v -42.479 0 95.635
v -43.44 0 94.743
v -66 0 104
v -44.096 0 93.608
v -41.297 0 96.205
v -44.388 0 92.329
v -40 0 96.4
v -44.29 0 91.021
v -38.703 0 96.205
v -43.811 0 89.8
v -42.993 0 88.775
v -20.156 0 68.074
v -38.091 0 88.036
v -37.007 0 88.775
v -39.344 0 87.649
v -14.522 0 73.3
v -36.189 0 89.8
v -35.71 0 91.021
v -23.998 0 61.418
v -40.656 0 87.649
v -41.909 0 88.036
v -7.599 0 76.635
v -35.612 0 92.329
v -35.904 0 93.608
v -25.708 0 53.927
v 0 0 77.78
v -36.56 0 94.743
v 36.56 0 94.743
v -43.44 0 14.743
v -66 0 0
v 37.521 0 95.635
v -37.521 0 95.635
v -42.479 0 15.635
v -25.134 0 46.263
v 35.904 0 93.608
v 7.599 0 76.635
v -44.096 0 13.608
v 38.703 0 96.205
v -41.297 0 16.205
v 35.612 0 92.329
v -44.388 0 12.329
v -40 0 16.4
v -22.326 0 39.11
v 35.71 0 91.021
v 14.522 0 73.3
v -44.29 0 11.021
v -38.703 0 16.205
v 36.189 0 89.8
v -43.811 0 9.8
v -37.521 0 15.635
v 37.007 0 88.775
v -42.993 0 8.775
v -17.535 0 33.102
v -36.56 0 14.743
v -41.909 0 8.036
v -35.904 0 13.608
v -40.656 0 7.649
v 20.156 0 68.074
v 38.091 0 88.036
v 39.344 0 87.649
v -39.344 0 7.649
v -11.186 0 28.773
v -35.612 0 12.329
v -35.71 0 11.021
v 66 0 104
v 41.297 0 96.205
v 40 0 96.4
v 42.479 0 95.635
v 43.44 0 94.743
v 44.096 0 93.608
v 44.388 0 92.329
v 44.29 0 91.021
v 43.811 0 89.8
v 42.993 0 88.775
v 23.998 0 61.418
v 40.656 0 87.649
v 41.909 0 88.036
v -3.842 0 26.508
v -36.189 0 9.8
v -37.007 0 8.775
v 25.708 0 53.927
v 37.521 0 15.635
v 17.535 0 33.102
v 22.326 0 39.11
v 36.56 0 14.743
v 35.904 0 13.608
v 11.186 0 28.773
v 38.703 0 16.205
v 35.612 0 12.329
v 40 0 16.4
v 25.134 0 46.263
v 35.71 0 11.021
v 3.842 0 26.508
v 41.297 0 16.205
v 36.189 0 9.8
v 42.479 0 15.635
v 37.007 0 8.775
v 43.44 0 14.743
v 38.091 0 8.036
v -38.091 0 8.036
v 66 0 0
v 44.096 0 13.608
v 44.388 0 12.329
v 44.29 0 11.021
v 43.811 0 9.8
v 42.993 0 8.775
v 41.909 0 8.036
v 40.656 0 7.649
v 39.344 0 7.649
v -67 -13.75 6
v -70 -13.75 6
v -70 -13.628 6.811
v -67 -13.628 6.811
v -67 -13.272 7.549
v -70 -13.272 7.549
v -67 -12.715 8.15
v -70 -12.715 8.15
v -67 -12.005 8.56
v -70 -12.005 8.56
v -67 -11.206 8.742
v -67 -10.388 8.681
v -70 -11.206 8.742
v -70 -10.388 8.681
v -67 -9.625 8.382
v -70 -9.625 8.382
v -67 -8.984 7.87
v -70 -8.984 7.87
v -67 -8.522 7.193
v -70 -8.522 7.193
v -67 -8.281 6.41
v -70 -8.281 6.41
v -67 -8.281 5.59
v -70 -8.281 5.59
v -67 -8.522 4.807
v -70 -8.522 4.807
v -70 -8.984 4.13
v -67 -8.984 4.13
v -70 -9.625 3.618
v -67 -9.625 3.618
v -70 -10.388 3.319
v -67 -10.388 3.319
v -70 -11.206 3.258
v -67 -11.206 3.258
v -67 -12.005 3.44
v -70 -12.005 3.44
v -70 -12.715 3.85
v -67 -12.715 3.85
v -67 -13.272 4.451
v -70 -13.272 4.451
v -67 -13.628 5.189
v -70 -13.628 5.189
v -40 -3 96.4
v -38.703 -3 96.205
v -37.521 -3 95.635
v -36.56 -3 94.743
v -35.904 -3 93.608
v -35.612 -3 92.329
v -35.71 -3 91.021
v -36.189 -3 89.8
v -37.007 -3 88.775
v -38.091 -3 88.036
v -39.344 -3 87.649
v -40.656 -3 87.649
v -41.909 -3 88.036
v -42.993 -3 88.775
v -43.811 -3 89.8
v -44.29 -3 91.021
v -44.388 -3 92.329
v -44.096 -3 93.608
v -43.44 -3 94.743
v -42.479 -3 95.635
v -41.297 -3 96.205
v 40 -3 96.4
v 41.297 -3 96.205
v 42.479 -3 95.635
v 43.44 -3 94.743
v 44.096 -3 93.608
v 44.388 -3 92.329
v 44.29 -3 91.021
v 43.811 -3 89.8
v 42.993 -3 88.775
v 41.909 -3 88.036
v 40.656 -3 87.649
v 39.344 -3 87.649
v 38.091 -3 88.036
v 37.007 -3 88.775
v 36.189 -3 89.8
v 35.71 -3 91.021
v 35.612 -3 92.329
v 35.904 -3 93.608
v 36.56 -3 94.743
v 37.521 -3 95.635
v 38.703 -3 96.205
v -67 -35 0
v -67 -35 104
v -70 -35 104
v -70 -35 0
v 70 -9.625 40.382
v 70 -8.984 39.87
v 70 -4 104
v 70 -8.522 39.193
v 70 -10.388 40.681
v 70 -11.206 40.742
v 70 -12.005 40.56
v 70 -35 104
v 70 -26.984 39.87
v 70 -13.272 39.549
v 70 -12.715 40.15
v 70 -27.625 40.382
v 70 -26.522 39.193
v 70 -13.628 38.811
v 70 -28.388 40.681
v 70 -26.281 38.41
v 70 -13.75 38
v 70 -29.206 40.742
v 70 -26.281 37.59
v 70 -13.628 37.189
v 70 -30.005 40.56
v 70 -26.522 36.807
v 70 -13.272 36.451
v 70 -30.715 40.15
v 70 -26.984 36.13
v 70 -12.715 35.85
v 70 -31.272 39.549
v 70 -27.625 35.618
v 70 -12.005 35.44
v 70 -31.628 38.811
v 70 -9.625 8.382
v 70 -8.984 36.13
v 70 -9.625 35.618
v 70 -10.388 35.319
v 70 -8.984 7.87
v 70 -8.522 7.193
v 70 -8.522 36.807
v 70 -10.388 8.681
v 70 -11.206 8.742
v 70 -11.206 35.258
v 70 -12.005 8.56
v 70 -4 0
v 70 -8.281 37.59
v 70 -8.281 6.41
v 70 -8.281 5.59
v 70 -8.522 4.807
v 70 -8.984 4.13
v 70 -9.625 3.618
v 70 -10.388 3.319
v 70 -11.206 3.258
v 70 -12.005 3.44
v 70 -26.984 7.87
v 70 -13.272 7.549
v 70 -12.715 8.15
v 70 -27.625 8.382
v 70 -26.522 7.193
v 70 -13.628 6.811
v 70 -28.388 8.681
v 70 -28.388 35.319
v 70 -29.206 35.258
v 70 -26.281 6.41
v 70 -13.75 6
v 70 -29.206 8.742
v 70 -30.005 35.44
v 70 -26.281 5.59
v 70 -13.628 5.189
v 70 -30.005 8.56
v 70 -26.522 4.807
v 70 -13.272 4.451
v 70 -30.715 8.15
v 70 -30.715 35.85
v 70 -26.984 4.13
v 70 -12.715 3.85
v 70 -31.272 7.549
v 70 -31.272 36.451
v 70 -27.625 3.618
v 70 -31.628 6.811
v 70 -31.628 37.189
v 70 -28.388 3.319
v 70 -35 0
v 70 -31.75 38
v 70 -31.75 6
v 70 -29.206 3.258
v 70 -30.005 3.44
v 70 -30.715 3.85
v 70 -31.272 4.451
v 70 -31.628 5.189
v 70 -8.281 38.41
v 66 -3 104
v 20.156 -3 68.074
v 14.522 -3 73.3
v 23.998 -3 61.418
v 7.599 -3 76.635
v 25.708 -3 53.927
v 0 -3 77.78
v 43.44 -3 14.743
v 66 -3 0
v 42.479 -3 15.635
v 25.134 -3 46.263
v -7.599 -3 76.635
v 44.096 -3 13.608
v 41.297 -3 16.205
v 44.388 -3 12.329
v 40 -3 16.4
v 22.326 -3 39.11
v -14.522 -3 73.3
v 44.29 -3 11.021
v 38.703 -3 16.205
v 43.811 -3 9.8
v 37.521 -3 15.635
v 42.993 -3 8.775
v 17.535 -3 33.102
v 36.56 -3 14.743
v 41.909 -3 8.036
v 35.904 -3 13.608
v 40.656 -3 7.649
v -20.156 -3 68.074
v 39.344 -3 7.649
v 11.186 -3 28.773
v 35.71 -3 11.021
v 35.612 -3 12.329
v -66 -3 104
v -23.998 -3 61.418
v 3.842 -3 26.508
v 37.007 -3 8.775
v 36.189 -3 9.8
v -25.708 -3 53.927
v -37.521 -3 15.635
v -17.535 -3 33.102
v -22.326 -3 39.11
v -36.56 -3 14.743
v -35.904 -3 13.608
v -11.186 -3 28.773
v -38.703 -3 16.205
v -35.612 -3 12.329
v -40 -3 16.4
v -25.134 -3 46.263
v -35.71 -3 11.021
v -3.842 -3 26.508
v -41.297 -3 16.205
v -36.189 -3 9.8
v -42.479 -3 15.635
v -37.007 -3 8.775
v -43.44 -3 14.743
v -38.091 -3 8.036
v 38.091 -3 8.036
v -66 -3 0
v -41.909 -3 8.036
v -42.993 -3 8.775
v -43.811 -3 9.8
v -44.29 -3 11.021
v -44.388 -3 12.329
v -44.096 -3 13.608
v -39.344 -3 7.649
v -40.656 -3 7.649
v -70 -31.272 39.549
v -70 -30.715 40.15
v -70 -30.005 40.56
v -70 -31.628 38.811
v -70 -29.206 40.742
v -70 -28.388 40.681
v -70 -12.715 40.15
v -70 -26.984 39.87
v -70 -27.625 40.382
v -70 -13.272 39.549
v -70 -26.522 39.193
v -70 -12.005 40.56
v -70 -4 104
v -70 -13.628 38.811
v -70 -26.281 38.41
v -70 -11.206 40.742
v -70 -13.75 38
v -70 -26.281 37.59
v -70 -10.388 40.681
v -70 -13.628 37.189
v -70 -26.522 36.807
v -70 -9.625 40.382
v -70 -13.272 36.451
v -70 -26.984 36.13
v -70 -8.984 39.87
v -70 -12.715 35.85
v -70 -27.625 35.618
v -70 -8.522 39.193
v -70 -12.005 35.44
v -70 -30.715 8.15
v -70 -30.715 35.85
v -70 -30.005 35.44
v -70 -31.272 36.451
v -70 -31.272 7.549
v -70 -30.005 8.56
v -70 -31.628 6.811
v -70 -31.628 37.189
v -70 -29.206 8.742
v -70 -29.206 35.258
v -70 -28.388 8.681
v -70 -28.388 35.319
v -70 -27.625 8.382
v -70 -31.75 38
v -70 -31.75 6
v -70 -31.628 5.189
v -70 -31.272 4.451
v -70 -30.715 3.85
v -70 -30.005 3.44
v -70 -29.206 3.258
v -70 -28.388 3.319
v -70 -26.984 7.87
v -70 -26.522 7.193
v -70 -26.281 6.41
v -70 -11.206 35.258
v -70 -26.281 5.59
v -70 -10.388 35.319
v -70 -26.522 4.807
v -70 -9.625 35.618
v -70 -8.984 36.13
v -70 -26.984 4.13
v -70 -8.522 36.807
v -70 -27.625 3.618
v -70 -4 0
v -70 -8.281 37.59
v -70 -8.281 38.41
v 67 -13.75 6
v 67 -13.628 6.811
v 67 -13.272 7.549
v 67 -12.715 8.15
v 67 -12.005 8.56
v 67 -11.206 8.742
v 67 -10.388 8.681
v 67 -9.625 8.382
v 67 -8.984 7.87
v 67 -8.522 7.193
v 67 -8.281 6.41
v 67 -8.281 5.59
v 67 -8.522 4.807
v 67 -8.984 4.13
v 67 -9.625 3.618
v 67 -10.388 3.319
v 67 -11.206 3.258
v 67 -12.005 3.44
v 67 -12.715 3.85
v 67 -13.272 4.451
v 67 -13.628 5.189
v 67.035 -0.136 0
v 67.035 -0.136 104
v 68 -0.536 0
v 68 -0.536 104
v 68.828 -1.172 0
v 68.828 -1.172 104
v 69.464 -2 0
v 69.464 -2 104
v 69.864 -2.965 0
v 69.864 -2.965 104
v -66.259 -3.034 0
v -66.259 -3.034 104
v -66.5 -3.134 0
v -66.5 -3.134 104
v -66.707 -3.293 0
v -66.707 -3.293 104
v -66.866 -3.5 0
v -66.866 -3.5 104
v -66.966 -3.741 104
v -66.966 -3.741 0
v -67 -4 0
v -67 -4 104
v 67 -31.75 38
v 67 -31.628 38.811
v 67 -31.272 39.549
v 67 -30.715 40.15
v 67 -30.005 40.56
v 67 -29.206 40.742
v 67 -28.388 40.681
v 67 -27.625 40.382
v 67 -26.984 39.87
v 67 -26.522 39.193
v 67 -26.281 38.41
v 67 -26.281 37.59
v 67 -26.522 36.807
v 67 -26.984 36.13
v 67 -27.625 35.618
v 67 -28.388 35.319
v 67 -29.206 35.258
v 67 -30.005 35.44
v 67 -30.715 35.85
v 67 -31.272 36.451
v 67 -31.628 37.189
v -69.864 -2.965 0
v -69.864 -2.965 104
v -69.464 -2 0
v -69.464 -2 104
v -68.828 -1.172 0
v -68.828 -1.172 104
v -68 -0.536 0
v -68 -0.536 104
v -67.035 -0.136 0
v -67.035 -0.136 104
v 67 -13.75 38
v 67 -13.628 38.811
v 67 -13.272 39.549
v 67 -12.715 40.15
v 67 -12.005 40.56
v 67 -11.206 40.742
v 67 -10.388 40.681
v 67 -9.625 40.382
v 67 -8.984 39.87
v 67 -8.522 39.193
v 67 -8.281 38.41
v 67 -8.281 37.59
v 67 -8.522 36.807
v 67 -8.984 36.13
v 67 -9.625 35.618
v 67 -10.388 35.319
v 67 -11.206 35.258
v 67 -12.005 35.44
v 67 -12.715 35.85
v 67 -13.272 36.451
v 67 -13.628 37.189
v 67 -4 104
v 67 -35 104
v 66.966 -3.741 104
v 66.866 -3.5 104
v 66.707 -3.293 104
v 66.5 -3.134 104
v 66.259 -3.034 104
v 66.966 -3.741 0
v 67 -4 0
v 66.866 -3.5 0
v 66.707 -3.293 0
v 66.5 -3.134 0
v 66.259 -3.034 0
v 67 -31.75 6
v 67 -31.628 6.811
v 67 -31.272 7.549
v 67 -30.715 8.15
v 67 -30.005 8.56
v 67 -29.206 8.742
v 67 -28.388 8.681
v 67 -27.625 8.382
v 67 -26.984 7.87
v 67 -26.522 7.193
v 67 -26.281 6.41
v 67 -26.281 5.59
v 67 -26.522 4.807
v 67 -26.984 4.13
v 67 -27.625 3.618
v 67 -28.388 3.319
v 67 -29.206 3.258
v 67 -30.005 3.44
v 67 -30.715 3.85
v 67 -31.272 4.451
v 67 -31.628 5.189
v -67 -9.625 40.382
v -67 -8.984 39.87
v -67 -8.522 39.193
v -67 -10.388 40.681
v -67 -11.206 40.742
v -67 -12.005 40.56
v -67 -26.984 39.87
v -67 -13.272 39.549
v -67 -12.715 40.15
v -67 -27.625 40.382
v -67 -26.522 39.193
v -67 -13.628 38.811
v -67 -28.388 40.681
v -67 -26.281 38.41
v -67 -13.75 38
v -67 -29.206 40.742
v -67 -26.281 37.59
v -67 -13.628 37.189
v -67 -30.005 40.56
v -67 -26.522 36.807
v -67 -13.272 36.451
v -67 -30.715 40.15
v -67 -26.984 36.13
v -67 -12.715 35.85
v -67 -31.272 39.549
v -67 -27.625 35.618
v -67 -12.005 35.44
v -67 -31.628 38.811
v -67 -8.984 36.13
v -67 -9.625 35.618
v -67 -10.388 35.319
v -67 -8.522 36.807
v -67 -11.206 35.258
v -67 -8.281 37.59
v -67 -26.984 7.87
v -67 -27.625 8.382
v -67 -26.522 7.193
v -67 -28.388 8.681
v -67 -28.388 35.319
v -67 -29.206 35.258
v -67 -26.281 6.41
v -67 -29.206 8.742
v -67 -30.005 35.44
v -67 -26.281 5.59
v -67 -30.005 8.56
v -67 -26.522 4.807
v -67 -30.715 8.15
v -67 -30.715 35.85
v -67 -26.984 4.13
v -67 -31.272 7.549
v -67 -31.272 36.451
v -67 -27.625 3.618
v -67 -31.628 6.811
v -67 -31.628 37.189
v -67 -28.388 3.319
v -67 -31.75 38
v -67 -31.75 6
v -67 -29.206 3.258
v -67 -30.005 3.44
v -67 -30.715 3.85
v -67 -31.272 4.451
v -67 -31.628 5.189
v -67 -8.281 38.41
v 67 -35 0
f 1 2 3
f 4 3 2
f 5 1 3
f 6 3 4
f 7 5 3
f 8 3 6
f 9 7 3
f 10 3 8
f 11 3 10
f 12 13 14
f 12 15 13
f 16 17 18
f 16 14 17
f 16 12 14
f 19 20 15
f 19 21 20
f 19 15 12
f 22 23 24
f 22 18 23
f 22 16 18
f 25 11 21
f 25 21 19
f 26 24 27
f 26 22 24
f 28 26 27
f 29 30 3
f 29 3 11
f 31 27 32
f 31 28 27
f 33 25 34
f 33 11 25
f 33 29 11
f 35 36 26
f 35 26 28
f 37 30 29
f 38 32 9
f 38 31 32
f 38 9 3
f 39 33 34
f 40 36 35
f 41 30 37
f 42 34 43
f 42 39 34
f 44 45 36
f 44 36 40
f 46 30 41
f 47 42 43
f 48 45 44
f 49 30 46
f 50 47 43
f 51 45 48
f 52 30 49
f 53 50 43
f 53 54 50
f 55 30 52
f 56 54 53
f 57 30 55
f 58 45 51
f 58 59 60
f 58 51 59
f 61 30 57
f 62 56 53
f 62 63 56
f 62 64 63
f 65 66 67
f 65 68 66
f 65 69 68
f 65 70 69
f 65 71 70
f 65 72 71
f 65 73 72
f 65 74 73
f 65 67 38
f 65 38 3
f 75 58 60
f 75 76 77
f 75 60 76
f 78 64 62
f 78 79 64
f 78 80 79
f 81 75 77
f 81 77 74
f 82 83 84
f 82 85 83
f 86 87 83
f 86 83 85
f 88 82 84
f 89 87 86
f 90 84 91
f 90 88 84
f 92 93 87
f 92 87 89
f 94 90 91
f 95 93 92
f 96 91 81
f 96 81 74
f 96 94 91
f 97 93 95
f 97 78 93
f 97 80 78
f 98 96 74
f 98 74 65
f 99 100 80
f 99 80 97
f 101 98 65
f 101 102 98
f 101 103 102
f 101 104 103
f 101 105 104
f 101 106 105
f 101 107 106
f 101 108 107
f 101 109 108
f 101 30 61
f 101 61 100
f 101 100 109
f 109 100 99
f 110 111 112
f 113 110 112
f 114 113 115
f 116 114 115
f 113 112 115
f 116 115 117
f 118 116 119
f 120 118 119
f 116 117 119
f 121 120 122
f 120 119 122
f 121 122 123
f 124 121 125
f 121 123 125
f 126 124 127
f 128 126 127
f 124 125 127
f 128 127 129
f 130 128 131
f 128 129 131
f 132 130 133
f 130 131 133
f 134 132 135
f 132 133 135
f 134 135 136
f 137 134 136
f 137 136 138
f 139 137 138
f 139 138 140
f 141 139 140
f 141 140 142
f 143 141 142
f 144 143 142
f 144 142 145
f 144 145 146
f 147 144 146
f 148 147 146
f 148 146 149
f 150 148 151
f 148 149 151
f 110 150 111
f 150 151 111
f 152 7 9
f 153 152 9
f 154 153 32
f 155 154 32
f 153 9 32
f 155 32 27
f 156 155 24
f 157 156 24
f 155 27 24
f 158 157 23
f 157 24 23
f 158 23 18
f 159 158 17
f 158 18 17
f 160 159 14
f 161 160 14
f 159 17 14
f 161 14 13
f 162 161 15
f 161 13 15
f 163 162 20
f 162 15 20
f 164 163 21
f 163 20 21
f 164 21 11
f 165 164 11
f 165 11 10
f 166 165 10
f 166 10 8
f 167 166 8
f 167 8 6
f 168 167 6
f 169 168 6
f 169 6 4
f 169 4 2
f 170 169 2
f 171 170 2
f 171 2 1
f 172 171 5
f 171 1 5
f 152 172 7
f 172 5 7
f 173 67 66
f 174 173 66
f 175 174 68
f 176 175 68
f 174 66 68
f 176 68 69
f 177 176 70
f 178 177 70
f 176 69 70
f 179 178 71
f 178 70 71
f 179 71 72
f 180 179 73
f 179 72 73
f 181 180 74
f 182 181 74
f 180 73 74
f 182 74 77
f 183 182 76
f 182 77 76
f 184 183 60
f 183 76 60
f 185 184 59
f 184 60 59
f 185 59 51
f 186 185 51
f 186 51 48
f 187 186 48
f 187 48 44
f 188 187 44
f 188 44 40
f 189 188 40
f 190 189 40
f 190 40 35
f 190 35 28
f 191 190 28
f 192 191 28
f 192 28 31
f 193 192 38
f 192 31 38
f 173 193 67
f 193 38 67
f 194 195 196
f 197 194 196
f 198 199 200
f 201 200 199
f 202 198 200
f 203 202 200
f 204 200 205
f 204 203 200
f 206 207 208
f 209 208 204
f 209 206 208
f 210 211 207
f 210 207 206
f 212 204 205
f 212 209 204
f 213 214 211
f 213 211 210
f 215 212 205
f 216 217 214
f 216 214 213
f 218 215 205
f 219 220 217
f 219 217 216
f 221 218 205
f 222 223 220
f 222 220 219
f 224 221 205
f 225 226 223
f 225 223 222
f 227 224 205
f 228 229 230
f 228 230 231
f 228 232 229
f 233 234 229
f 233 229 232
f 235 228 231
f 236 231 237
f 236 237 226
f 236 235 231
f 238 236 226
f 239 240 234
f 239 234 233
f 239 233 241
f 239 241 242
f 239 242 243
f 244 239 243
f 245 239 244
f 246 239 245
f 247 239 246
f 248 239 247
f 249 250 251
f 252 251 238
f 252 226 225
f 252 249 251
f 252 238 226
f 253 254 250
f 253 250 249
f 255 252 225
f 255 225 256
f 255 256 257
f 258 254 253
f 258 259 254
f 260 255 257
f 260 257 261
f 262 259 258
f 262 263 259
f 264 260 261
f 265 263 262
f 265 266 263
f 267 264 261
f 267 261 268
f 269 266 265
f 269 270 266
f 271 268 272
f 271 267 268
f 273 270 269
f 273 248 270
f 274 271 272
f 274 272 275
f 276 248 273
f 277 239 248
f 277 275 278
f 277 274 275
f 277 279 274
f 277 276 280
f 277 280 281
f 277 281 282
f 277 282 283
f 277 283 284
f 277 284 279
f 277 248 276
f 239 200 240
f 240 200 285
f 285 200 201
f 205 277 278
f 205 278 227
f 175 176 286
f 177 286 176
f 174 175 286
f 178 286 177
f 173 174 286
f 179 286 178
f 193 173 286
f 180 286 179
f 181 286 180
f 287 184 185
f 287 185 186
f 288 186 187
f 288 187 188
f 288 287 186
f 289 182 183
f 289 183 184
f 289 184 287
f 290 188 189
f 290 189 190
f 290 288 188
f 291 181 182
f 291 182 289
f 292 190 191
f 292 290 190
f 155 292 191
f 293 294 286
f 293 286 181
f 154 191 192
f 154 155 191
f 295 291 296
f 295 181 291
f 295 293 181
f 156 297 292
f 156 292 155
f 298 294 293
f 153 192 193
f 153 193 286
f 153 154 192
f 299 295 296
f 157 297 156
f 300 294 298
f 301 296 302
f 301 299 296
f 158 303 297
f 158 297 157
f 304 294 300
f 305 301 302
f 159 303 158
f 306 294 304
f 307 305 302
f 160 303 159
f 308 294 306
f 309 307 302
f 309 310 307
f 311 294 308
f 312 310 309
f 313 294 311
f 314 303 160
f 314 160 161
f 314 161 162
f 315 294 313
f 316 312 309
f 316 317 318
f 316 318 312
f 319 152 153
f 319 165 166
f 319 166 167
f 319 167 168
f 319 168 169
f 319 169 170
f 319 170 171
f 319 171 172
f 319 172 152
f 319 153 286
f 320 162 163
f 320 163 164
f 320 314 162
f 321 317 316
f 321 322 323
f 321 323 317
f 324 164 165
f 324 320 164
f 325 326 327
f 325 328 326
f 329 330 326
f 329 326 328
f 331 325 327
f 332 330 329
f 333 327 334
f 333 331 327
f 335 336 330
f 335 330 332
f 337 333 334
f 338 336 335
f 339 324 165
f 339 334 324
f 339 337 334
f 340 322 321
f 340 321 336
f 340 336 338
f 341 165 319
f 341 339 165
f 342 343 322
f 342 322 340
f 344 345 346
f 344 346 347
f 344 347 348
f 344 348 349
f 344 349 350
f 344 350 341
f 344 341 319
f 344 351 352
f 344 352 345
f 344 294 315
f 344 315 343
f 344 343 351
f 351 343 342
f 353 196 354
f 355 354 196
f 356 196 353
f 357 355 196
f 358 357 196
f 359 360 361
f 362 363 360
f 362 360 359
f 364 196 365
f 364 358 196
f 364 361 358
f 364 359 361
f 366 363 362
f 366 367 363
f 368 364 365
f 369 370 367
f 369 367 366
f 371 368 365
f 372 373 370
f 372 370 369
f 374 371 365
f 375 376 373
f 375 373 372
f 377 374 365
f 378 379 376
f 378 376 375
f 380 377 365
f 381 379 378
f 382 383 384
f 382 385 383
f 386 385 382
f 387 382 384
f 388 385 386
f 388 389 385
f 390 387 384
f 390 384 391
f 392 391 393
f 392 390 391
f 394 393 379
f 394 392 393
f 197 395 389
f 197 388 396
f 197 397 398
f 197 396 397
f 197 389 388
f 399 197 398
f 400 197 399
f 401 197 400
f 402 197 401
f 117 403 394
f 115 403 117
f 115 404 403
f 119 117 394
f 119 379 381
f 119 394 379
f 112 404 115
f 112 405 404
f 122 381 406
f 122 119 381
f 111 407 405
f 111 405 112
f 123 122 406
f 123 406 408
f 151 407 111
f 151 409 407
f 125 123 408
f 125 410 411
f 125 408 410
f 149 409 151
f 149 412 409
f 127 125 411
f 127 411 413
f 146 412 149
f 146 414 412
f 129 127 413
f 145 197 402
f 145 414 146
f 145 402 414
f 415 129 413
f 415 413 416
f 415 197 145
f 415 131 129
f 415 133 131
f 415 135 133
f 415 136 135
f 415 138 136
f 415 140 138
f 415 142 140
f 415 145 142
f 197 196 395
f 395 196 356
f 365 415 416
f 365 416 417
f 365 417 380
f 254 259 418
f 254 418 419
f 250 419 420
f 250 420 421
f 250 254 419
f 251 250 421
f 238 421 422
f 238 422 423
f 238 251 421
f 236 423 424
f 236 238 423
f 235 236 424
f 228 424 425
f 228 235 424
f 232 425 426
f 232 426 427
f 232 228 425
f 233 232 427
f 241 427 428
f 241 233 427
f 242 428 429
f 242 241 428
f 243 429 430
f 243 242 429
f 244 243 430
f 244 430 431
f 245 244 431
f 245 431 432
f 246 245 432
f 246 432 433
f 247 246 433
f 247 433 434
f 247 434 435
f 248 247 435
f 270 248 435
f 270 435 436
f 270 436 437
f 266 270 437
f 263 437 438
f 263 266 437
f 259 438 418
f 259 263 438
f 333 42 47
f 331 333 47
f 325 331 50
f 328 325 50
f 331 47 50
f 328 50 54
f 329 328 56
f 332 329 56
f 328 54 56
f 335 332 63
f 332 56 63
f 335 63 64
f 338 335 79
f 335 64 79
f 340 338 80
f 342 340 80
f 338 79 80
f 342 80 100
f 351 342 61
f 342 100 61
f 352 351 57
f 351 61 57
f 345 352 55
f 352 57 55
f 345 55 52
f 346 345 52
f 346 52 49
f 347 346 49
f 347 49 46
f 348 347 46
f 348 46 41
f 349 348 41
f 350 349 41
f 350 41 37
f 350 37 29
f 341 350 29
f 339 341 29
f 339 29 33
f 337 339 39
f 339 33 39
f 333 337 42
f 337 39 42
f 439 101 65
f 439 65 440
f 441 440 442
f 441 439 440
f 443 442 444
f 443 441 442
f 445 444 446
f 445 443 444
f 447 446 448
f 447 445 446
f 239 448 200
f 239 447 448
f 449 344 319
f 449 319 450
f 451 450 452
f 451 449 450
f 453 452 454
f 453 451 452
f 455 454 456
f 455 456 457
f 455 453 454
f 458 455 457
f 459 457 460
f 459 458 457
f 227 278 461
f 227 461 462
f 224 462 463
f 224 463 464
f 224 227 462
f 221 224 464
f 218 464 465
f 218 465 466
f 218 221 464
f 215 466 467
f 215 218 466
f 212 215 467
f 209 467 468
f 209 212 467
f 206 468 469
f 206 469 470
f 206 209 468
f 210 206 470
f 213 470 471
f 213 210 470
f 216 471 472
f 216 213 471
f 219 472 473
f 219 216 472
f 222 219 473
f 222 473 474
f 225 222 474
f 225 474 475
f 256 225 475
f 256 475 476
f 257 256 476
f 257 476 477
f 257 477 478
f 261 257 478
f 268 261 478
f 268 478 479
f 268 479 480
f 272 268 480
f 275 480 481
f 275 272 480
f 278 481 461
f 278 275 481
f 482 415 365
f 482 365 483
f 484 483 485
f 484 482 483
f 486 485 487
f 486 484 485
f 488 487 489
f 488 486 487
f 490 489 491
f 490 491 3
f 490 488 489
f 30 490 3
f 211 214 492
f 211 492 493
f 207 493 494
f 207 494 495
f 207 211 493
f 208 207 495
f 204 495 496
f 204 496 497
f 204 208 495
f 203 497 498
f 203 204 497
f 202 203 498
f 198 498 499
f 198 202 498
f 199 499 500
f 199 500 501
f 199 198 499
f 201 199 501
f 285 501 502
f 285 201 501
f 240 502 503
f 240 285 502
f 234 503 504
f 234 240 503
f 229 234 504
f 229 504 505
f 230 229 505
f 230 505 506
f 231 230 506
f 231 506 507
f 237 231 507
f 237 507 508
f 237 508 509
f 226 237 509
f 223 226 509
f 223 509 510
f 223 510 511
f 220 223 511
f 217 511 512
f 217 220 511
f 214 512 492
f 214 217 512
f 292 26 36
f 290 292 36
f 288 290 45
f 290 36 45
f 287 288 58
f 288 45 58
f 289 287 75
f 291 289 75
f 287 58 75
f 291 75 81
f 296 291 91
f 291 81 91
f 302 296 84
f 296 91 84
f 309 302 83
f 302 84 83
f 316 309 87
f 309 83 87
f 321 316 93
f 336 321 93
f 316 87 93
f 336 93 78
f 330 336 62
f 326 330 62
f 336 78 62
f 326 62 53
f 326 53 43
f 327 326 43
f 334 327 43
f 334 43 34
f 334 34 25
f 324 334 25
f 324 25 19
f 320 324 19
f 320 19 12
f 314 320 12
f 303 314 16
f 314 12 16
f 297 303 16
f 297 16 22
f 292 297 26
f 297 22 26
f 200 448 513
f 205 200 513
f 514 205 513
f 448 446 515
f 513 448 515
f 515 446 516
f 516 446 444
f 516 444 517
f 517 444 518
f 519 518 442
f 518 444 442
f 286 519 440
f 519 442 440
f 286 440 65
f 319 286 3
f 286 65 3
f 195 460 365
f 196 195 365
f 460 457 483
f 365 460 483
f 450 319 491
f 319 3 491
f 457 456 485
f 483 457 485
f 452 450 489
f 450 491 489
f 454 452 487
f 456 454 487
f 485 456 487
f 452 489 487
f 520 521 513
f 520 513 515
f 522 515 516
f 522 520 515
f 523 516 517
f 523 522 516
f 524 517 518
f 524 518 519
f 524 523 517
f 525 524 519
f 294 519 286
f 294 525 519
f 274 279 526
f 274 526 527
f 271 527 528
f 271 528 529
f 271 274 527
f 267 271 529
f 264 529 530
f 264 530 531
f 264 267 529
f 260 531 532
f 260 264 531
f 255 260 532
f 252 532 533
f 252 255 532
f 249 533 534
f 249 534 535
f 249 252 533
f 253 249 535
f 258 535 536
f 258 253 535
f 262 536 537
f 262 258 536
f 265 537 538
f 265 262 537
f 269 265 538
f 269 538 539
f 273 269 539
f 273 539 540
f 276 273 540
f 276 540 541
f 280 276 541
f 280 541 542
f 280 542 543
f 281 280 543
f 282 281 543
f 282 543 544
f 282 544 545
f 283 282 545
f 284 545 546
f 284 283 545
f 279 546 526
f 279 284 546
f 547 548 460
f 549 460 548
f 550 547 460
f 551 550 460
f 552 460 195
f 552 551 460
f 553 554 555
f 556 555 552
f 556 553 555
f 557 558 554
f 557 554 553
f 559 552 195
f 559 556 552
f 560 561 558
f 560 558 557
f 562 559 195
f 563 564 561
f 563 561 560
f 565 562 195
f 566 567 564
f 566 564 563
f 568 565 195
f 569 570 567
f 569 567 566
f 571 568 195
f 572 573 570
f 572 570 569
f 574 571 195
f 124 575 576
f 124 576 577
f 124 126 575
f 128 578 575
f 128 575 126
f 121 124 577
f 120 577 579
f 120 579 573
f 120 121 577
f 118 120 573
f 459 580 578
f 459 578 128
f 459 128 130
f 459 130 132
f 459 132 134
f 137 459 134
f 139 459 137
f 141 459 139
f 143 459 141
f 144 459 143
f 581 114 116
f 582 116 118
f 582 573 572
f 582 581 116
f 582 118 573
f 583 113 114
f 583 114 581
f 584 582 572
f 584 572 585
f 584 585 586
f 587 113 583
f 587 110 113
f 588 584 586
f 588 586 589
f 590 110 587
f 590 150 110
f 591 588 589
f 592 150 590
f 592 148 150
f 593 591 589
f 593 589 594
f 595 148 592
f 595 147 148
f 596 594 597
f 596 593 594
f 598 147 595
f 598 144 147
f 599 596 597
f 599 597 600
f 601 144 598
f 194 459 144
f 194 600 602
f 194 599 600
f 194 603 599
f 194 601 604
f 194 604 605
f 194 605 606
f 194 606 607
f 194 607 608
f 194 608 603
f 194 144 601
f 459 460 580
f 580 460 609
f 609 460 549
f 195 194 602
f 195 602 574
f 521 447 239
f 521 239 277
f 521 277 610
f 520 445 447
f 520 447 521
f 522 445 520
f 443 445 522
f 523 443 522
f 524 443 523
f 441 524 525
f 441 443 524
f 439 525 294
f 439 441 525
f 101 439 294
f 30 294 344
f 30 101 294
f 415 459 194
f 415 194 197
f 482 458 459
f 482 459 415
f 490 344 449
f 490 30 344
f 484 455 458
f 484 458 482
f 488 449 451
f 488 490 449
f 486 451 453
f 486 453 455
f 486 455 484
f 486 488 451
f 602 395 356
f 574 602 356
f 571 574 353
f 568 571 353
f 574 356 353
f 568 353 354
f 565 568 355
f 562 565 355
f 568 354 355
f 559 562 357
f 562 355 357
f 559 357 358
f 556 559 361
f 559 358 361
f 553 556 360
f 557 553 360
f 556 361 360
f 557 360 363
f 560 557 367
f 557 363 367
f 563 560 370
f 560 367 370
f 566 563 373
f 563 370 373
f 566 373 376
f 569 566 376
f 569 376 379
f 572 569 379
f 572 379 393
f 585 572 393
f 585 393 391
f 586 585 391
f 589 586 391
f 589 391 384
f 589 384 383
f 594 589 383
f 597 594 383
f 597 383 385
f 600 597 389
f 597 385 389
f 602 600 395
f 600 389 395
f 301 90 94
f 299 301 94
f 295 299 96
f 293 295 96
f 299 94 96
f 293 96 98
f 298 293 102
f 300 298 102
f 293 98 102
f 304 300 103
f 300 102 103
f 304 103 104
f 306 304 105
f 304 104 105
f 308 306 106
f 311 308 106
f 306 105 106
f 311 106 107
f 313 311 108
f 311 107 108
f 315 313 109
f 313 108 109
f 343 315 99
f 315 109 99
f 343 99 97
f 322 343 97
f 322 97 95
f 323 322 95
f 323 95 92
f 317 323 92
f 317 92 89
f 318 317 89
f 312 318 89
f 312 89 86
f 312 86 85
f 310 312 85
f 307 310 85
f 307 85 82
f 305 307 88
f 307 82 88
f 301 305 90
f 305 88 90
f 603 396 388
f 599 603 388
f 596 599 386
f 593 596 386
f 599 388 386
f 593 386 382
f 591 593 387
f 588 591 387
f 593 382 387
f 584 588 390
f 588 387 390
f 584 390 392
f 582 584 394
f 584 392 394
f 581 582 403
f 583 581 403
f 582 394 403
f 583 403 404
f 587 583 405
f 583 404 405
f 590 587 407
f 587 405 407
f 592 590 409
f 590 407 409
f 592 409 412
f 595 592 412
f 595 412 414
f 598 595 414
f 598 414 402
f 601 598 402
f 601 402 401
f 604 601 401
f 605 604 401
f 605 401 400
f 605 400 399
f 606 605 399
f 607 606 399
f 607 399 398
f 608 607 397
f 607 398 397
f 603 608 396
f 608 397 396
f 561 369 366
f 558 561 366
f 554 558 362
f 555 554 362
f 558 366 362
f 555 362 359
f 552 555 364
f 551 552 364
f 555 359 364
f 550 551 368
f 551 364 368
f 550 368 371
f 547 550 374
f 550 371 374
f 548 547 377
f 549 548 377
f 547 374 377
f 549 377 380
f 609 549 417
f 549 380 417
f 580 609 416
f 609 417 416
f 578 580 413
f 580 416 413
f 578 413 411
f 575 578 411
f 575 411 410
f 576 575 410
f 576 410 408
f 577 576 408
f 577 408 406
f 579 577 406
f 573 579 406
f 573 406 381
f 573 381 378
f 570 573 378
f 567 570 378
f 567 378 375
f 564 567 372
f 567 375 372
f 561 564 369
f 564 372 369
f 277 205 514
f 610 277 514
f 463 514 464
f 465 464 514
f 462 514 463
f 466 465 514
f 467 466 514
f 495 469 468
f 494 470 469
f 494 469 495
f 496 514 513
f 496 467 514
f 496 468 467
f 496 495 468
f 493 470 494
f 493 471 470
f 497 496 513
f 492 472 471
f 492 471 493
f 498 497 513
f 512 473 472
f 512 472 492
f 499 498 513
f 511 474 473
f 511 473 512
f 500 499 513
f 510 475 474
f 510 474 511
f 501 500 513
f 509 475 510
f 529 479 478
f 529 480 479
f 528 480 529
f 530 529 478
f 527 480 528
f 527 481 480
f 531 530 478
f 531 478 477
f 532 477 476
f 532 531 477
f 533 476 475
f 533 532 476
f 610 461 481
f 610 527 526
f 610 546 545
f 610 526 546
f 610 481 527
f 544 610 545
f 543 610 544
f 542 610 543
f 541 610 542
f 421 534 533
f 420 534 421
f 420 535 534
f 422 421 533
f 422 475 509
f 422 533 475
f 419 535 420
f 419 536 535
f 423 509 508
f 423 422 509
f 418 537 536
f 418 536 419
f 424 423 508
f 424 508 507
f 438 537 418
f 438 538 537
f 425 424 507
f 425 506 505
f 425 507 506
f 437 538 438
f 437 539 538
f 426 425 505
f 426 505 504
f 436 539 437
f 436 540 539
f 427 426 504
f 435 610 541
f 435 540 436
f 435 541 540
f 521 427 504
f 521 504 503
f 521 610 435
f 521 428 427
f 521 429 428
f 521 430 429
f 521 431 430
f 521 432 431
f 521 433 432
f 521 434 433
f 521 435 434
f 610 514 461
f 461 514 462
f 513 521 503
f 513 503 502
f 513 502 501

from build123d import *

# Parameters (mm, degrees)
SM_BASE_FLANGE_1_DEPTH = 104
SKETCH_7_R             = 2.75
CUT_EXTRUDE_3_DEPTH    = 3
SKETCH_8_R             = 25.78
CUT_EXTRUDE_4_DEPTH    = 3
SKETCH_9_R             = 4.4
CUT_EXTRUDE_5_DEPTH    = 3


# Sheet-metal steps are written as plain solids
with BuildPart() as part:
    # Sketch 1 → 基体-法兰1 (new body)
    with BuildSketch(Plane.XY):
        with BuildLine():
            Line((-70, -35), (-70, -4))
            ThreePointArc((-70, -4), (-68.828427125, -1.171572875), (-66, 0))
            Line((-66, 0), (66, 0))
            ThreePointArc((66, 0), (68.828427125, -1.171572875), (70, -4))
            Line((70, -4), (70, -35))
            Line((70, -35), (67, -35))
            Line((67, -35), (67, -4))
            ThreePointArc((67, -4), (66.707106781, -3.292893219), (66, -3))
            Line((66, -3), (-66, -3))
            ThreePointArc((-66, -3), (-66.707106781, -3.292893219), (-67, -4))
            Line((-67, -4), (-67, -35))
            Line((-67, -35), (-70, -35))
        make_face()
    extrude(amount=SM_BASE_FLANGE_1_DEPTH)

    # 草图7 → 切除-拉伸3 (cut)
    with BuildSketch(Plane.ZY.offset(70)):
        with Locations(Location((38, -29, 0), (0, 0, 270))):
            Circle(SKETCH_7_R)
        with Locations(Location((38, -11, 0), (0, 0, 270))):
            Circle(SKETCH_7_R)
        with Locations(Location((6, -11, 0), (0, 0, 270))):
            Circle(SKETCH_7_R)
        with Locations(Location((6, -29, 0), (0, 0, 270))):
            Circle(SKETCH_7_R)
    cut_extrude_3 = extrude(amount=-CUT_EXTRUDE_3_DEPTH, mode=Mode.SUBTRACT)

    # 镜向2: 切除-拉伸3 across plane
    add(cut_extrude_3.mirror(Plane(origin=(0, 0, 0), x_dir=(0, 0, 1), z_dir=(1, 0, 0))), mode=Mode.SUBTRACT)

    # 草图8 → 切除-拉伸4 (cut)
    with BuildSketch(Plane(origin=(0, 0, 0), x_dir=(1, 0, 0), z_dir=(0, 1, 0))):
        with Locations(Location((0, -52, 0), (0, 0, 270))):
            Circle(SKETCH_8_R)
    extrude(amount=-CUT_EXTRUDE_4_DEPTH, mode=Mode.SUBTRACT)

    # 草图9 → 切除-拉伸5 (cut)
    with BuildSketch(Plane(origin=(0, 0, 0), x_dir=(1, 0, 0), z_dir=(0, 1, 0))):
        with Locations(Location((-40, -12, 0), (0, 0, 270))):
            Circle(SKETCH_9_R)
        with Locations(Location((40, -12, 0), (0, 0, 270))):
            Circle(SKETCH_9_R)
        with Locations(Location((-40, -92, 0), (0, 0, 270))):
            Circle(SKETCH_9_R)
        with Locations(Location((40, -92, 0), (0, 0, 270))):
            Circle(SKETCH_9_R)
    extrude(amount=-CUT_EXTRUDE_5_DEPTH, mode=Mode.SUBTRACT)


solid = part.part
